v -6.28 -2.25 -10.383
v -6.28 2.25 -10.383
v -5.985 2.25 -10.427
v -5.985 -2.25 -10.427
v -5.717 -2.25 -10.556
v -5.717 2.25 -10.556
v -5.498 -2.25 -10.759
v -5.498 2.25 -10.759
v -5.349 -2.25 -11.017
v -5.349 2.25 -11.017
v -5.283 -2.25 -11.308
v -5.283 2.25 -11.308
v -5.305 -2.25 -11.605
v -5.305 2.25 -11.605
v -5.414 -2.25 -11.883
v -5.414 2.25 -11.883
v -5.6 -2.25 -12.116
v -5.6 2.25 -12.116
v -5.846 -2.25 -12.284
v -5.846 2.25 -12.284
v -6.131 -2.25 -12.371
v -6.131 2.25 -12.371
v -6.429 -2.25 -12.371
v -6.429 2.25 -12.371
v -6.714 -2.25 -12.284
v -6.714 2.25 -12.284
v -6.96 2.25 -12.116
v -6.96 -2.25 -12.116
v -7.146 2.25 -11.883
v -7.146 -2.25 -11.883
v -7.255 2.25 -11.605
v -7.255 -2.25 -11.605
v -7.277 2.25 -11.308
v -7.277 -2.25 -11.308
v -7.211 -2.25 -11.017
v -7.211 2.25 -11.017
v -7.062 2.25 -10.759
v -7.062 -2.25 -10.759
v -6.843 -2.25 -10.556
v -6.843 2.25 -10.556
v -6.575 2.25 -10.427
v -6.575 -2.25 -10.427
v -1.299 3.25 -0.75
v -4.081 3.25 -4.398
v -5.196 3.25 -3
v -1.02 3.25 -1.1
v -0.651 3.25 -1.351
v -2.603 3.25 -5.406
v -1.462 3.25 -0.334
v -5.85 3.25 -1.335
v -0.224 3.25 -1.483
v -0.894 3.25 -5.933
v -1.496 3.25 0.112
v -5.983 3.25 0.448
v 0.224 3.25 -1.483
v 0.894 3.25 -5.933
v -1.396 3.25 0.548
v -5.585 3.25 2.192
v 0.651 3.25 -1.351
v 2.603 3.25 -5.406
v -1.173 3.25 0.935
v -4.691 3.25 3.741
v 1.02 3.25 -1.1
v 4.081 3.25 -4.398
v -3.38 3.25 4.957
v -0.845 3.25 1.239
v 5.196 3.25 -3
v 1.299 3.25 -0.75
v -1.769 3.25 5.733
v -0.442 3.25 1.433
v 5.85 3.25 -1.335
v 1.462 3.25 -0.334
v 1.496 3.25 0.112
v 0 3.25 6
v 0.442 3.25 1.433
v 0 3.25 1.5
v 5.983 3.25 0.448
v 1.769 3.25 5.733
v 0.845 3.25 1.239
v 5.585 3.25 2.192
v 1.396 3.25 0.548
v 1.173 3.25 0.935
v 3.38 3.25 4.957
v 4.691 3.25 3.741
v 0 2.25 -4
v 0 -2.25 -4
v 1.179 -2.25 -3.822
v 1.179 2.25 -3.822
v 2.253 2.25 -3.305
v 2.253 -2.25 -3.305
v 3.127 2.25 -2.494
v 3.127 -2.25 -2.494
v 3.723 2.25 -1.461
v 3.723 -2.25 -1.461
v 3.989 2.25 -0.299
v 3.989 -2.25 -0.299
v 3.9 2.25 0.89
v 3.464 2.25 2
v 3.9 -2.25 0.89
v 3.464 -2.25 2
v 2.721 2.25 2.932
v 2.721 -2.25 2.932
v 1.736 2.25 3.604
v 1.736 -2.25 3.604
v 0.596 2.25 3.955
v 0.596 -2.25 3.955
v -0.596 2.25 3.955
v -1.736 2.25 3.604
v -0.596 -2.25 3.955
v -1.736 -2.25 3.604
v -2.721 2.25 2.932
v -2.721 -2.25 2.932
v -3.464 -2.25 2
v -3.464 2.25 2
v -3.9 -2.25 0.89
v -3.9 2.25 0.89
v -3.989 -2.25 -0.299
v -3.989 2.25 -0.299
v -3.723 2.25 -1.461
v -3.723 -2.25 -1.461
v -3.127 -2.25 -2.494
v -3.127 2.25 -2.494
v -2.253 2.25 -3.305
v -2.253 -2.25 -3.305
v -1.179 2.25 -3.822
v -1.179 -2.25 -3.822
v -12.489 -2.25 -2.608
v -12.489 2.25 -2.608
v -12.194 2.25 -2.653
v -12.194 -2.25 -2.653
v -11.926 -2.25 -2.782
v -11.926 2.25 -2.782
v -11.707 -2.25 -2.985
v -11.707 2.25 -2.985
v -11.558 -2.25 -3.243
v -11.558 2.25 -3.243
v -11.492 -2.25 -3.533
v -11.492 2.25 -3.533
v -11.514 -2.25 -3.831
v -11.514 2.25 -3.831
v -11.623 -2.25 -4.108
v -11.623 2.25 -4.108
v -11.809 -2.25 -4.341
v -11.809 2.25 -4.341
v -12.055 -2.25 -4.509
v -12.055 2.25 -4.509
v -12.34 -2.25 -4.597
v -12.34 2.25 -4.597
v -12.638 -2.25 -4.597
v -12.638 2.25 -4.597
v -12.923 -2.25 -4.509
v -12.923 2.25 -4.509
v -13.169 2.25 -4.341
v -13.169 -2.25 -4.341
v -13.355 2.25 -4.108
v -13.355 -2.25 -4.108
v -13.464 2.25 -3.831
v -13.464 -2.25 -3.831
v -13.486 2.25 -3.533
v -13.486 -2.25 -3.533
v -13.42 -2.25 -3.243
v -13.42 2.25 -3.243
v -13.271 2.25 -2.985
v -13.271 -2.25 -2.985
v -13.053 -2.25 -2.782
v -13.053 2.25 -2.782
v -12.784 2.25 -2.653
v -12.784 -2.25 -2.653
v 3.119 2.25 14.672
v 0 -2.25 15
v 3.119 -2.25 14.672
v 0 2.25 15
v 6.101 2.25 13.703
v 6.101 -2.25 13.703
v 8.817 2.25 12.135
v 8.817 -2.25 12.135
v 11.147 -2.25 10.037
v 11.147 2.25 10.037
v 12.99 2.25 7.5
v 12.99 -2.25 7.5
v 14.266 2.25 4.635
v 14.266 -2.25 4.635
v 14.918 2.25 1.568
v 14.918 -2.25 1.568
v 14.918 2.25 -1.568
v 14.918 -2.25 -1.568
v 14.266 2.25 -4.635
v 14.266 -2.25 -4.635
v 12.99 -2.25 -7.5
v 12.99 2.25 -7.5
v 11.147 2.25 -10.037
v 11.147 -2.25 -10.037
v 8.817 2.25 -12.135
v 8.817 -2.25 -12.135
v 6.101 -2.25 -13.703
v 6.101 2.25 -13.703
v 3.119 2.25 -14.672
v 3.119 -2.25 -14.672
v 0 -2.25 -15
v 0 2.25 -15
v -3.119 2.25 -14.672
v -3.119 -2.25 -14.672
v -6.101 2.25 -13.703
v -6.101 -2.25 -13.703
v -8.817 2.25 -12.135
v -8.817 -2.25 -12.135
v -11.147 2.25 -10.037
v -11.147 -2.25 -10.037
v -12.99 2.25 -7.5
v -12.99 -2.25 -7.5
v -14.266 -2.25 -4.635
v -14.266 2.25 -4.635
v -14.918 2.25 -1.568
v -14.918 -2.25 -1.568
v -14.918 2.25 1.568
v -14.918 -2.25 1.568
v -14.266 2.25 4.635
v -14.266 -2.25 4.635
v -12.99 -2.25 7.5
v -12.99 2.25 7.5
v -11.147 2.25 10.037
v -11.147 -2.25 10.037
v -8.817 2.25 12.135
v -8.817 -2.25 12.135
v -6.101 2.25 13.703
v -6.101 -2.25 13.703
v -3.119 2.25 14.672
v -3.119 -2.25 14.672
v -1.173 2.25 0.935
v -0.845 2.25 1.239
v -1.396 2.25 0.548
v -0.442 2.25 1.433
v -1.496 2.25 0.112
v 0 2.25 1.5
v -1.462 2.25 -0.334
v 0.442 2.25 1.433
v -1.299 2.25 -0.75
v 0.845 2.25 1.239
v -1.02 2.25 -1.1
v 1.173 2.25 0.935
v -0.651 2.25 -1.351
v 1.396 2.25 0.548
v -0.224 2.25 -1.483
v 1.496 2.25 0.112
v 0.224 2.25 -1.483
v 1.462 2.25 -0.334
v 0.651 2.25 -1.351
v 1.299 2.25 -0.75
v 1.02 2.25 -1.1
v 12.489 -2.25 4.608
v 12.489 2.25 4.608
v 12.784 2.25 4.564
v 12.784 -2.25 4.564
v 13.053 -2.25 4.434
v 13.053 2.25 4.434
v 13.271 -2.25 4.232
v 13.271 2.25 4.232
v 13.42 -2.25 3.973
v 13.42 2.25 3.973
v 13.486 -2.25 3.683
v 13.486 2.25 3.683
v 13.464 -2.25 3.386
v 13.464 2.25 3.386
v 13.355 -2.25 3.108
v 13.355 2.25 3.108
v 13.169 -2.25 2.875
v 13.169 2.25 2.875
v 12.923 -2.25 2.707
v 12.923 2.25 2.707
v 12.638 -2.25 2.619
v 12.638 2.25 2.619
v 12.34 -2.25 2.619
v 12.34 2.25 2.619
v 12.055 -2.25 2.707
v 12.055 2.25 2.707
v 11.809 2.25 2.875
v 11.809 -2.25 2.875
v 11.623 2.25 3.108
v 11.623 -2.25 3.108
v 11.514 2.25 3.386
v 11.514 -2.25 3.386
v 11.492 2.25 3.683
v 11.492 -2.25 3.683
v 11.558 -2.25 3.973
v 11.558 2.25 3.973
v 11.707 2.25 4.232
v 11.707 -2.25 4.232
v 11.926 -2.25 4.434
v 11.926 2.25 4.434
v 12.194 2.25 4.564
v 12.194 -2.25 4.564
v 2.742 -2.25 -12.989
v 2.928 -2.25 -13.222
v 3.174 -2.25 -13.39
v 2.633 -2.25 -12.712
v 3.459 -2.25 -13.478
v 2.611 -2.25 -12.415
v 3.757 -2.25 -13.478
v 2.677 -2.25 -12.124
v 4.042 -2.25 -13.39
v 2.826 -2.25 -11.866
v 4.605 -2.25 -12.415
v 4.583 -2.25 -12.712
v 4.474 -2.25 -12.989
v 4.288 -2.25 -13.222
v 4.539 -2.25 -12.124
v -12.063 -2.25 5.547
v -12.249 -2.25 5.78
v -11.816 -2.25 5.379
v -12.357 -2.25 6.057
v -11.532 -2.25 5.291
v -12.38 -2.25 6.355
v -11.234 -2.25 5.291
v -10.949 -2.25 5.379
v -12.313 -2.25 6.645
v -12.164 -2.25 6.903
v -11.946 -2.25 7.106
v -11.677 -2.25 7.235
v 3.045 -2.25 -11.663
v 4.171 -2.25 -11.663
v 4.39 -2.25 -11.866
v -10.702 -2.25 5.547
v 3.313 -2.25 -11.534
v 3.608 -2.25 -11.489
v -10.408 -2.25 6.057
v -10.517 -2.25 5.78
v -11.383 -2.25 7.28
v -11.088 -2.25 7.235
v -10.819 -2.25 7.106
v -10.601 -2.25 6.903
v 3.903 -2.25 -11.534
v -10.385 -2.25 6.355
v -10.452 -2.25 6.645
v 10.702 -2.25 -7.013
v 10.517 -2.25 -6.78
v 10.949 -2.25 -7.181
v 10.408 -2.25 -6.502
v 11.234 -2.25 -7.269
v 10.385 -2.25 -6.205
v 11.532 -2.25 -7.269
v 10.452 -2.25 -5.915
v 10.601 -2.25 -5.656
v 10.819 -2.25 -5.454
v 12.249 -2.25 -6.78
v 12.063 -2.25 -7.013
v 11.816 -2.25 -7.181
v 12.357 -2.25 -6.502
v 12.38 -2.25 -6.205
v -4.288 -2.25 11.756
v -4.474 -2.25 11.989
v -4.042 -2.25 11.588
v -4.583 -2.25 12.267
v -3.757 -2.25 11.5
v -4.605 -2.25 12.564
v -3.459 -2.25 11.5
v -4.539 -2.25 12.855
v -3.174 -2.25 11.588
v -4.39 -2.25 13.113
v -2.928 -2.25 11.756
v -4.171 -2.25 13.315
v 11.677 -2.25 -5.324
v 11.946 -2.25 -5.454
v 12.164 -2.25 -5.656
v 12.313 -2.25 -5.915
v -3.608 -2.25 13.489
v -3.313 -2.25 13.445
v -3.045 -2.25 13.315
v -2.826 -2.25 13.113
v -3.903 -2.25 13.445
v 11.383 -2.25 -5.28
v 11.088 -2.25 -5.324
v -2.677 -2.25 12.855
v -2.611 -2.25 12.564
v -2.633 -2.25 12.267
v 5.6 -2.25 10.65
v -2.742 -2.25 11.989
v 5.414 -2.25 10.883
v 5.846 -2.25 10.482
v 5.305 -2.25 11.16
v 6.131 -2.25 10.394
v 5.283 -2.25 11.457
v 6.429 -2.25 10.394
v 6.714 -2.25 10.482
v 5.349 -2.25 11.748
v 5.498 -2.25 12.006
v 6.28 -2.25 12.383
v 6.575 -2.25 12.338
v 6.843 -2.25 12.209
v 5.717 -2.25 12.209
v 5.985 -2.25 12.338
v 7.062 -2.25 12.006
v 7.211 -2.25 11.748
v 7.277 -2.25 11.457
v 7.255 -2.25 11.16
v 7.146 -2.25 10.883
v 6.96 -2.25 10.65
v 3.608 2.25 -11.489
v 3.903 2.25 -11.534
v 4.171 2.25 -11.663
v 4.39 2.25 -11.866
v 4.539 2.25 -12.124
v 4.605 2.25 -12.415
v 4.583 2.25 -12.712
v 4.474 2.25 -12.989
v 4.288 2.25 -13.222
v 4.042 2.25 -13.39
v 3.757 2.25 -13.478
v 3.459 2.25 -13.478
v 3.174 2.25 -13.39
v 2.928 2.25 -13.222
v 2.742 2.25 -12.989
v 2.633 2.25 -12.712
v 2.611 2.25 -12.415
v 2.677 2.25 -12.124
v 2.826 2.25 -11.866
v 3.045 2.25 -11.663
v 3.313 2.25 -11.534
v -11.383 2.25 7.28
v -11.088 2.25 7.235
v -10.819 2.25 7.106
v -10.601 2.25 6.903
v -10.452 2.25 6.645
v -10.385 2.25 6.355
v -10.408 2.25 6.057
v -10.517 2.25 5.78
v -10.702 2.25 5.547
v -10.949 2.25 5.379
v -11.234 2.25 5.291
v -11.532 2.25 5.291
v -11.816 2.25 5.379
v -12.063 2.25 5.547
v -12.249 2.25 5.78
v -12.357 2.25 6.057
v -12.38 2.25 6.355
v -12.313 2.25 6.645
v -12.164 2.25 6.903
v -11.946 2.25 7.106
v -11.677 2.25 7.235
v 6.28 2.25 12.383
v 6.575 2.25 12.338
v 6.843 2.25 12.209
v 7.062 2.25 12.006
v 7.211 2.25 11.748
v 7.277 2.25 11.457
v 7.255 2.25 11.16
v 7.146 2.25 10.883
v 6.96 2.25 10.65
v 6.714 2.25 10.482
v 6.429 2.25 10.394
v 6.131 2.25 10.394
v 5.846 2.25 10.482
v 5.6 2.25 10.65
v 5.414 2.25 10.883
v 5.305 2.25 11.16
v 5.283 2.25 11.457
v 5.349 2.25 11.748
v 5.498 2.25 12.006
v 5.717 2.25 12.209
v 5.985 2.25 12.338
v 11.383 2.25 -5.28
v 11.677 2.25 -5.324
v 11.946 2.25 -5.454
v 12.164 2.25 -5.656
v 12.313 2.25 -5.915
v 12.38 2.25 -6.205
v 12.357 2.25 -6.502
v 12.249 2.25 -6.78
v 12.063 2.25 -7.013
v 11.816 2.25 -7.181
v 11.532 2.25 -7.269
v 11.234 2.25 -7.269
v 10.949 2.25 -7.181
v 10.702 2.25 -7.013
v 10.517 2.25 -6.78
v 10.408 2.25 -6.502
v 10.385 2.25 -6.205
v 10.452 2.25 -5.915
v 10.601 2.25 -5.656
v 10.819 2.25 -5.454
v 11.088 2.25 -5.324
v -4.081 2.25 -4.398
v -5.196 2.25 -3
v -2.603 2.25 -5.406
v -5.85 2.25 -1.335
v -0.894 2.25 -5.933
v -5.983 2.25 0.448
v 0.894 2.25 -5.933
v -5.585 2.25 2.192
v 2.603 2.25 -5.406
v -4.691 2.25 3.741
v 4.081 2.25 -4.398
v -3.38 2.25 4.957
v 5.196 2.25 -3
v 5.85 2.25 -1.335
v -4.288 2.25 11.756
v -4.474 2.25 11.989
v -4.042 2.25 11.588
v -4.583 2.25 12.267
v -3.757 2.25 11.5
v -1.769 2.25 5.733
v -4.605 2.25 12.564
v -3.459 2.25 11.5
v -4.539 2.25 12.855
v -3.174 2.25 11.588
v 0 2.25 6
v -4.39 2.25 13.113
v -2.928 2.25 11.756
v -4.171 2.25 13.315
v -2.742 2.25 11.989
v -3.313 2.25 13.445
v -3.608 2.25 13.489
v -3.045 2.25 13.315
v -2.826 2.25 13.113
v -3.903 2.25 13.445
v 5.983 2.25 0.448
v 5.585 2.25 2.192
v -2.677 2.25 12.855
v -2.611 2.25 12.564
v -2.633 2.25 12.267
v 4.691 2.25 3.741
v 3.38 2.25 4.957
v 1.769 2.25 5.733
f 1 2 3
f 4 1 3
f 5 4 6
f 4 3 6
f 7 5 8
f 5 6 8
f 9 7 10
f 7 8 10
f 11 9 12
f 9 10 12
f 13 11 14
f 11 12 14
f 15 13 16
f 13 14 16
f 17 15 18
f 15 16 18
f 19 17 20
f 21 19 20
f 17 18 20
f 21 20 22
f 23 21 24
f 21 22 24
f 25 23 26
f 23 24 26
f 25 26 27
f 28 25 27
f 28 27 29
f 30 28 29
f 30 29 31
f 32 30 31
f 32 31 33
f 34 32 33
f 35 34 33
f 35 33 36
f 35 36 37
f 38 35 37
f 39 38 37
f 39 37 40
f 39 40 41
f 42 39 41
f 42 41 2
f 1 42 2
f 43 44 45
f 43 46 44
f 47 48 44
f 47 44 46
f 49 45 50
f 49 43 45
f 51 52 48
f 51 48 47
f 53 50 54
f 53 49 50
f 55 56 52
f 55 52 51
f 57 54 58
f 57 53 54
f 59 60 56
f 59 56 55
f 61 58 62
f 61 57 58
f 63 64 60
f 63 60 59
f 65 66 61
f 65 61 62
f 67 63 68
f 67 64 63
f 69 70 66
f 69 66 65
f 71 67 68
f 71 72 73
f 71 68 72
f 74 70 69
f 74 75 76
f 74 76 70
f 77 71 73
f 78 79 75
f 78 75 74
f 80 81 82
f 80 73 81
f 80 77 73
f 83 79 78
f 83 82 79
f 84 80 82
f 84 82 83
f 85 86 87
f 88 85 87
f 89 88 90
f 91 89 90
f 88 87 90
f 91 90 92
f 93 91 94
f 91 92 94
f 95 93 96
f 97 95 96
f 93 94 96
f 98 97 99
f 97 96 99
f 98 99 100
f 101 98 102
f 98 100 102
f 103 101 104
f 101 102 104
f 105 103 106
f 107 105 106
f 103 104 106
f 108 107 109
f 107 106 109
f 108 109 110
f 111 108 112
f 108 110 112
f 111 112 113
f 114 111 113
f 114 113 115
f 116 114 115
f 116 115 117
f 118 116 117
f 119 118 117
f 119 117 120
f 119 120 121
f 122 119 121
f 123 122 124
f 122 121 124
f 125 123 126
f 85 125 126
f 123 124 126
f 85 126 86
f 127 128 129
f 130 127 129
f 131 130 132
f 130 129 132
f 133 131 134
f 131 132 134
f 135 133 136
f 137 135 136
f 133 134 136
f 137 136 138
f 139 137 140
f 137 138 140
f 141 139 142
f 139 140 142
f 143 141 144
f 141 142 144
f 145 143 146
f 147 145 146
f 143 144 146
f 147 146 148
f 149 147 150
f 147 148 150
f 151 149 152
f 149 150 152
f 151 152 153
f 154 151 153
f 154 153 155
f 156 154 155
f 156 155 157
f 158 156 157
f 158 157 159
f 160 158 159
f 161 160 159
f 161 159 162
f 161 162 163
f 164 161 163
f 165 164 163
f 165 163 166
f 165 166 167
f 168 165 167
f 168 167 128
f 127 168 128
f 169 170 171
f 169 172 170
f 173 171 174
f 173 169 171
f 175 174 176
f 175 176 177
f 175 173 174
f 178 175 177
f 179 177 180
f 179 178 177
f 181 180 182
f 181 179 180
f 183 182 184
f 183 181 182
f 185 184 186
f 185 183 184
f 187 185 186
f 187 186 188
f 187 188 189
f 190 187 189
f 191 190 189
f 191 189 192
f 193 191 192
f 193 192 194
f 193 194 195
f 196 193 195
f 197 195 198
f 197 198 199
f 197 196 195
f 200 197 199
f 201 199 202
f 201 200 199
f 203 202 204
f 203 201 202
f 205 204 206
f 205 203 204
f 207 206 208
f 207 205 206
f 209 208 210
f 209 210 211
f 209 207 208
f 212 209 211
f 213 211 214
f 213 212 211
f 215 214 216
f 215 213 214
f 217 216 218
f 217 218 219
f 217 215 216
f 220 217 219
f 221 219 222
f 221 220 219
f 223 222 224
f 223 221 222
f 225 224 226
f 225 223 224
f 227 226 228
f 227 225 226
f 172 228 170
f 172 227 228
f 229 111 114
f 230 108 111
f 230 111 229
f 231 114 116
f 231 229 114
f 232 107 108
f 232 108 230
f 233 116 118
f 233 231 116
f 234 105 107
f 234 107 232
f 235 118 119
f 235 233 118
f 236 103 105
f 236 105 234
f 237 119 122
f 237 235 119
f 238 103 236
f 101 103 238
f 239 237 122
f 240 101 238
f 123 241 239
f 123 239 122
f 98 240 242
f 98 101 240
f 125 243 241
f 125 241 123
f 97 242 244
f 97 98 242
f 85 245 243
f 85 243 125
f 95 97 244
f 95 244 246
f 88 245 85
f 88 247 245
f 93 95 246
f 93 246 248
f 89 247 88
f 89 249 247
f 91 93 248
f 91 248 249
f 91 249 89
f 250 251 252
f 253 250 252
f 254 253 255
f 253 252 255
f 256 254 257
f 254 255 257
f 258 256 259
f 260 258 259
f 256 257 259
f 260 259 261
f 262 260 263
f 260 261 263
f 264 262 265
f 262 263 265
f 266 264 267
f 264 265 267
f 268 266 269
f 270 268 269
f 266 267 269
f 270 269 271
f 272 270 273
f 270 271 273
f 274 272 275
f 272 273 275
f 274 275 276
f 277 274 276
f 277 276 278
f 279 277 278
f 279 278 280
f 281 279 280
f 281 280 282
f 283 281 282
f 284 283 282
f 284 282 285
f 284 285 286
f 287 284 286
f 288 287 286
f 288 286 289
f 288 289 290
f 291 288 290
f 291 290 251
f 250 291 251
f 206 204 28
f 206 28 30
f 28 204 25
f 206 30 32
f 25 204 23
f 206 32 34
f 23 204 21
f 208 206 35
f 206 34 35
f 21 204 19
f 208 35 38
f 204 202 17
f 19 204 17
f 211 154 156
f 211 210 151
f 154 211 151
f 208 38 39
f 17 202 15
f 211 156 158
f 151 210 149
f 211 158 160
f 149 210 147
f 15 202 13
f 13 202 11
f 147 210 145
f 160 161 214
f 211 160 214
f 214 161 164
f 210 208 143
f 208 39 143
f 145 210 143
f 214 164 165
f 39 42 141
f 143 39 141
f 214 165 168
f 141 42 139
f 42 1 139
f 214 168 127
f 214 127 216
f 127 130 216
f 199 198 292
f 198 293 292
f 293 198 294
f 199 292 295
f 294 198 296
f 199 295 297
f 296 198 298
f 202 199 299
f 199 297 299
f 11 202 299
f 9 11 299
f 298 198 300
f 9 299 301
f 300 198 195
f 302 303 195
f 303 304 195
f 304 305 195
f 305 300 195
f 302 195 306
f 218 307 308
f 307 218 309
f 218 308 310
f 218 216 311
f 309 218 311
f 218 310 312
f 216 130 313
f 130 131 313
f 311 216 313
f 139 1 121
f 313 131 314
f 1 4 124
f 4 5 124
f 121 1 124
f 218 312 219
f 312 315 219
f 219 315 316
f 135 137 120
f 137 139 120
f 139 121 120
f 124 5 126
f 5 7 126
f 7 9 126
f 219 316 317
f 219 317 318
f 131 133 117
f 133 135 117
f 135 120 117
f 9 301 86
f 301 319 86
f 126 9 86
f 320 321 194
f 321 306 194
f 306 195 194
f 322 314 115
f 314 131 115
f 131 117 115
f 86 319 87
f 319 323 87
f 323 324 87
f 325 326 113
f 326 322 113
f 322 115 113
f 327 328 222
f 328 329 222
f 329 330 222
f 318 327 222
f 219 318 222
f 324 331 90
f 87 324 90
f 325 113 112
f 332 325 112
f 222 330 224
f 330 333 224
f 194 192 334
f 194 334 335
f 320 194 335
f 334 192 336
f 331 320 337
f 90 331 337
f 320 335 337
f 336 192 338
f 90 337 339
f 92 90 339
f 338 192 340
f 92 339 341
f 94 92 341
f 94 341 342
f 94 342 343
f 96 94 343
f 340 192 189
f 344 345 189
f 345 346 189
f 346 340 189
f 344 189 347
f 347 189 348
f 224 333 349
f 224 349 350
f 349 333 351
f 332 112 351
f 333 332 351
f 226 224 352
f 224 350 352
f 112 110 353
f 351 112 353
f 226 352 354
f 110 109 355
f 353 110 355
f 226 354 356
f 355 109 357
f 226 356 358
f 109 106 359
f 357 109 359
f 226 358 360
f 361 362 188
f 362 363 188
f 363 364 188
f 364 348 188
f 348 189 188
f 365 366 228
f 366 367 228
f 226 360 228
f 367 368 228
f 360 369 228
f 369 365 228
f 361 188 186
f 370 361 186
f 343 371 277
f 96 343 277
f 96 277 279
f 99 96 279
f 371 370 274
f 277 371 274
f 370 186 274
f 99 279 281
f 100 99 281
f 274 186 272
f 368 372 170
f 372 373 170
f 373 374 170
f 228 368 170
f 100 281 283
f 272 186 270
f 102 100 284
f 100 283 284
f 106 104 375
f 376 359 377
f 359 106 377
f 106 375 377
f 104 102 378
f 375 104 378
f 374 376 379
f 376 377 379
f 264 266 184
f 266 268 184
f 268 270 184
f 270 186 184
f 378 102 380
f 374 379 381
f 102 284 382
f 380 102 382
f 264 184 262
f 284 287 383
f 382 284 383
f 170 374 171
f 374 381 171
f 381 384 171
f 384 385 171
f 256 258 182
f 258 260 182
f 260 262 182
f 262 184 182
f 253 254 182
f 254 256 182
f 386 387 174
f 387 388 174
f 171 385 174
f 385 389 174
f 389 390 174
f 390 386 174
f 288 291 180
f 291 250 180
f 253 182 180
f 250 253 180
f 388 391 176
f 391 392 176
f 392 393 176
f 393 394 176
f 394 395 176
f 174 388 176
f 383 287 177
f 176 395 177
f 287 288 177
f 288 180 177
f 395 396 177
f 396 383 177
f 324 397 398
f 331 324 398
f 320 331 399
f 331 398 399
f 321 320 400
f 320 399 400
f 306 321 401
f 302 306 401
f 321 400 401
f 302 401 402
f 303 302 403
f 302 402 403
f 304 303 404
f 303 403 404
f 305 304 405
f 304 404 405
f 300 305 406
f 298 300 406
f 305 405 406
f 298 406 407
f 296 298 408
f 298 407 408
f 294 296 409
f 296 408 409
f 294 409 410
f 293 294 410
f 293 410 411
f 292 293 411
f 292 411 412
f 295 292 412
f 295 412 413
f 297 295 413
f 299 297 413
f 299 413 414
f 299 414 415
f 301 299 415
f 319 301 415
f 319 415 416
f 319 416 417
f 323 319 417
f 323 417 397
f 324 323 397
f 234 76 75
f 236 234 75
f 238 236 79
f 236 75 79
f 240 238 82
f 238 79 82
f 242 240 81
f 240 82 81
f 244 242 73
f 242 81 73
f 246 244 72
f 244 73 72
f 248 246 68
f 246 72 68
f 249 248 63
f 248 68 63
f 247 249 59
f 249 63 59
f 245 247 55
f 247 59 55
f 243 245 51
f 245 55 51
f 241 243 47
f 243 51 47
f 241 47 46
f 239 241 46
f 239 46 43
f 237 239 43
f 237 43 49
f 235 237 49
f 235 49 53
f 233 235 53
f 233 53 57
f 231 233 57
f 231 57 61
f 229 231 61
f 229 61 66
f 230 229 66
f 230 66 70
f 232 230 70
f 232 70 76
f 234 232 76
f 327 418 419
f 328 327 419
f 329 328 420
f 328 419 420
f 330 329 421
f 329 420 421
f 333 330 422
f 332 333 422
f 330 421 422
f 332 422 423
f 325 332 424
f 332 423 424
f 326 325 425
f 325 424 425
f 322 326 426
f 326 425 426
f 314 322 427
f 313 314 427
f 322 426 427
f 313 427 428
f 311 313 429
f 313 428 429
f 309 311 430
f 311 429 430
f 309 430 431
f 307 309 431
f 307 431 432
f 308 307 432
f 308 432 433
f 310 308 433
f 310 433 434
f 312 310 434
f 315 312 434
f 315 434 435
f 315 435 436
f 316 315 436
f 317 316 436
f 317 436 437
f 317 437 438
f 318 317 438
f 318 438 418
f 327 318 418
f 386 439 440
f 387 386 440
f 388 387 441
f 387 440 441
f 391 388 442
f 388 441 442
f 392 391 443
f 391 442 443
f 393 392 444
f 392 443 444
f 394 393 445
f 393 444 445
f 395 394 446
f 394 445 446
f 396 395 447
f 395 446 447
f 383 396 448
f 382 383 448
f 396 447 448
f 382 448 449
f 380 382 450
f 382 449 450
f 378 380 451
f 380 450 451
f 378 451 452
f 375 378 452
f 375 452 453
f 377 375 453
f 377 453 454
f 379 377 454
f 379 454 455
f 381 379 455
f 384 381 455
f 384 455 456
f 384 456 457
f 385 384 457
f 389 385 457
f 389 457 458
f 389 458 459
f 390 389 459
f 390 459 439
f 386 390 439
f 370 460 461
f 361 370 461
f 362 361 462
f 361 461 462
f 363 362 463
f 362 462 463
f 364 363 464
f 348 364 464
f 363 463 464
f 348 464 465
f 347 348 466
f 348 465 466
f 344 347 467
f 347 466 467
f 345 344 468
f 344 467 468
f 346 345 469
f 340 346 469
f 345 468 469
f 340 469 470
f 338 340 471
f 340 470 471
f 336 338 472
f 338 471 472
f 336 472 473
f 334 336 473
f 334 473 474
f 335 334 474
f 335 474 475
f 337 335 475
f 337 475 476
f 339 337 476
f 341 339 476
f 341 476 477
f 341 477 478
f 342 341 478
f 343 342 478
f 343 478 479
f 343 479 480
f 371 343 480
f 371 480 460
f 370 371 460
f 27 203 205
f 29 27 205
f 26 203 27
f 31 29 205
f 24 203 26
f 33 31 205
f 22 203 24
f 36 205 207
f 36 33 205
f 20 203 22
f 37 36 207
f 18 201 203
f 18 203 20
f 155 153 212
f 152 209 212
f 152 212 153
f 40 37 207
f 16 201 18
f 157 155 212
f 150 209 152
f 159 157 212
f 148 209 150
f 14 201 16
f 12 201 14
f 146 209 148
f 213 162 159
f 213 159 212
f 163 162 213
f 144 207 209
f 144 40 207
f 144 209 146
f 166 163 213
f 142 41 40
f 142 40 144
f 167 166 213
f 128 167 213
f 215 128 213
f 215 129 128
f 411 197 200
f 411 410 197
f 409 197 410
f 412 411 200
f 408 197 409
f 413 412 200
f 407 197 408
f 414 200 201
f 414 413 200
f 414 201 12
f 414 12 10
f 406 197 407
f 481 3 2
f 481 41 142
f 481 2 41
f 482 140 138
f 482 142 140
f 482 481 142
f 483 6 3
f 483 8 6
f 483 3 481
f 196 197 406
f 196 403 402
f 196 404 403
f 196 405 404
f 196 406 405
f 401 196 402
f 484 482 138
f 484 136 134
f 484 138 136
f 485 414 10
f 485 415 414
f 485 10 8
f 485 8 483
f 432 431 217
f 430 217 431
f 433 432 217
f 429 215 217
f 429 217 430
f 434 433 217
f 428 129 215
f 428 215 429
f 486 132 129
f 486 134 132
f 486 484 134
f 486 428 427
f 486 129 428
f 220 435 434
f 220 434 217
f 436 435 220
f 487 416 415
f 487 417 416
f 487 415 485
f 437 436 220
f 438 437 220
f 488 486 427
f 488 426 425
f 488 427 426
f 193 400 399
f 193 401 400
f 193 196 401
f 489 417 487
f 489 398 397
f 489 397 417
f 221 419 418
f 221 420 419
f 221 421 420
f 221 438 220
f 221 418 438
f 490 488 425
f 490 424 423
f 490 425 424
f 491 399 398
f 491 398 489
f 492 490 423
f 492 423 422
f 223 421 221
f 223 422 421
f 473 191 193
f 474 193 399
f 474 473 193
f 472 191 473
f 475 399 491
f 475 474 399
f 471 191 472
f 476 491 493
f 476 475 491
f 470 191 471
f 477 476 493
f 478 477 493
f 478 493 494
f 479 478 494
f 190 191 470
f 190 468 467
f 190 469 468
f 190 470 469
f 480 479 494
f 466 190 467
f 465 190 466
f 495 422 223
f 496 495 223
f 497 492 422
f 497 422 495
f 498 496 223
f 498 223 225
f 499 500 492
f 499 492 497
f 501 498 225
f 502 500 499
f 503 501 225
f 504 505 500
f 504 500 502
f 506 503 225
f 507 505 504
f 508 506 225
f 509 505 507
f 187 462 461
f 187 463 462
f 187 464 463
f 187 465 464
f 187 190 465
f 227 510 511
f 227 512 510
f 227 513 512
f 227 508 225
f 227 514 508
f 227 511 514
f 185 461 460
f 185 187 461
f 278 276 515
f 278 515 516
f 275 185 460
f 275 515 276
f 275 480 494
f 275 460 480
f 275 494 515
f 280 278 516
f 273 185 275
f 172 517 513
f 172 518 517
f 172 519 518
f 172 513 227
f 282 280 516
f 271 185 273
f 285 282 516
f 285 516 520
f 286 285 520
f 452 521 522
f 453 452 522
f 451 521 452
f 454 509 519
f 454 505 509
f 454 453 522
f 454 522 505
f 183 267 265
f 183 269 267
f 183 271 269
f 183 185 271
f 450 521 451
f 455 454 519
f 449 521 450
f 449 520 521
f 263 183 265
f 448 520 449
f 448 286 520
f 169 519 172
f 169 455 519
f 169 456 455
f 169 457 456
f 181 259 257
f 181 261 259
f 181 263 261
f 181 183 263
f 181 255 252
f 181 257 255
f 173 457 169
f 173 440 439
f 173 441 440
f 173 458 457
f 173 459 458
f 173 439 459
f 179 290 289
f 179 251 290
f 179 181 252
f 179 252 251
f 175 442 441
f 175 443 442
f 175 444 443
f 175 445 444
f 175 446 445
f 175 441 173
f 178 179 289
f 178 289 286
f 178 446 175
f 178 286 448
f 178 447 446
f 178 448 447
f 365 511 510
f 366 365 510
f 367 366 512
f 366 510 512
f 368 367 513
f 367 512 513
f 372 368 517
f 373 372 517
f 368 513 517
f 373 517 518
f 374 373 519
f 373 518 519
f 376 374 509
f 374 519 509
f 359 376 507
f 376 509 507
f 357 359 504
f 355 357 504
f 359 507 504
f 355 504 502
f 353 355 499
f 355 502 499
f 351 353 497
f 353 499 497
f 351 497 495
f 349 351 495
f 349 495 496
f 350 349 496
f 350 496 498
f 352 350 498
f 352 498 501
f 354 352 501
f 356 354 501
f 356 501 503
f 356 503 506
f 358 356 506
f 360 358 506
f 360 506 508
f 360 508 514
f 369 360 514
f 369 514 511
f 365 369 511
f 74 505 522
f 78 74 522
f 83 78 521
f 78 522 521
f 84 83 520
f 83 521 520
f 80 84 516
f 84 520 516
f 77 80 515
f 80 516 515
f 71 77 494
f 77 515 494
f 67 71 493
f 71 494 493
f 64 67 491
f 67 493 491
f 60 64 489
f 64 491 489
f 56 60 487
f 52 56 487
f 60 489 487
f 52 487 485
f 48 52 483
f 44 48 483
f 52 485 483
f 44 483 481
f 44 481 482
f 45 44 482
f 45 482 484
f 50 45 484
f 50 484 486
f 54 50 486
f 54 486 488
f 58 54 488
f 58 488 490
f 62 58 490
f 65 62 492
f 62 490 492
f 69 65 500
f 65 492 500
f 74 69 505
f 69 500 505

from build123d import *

# Parameters (mm, degrees)
SKETCH_1_R          = 15
EXTRUDE_1_DEPTH     = 2.25
SKETCH_2_R          = 6
EXTRUDE_2_DEPTH     = 1
SKETCH_3_R          = 1
CUT_EXTRUDE_1_DEPTH = 5
SKETCH_4_R          = 4
CUT_EXTRUDE_2_DEPTH = 4.5
SKETCH_5_R          = 1.5
CUT_EXTRUDE_3_DEPTH = 4.5


with BuildPart() as part:
    # ｽｹｯﾁ1 → ﾎﾞｽ - 押し出し1 (new, symmetric)
    with BuildSketch(Plane(origin=(0, 0, 0), x_dir=(1, 0, 0), z_dir=(0, 1, 0))):
        with Locations(Location((0, 0, 0), (0, 0, 270))):
            Circle(SKETCH_1_R)
    extrude(amount=EXTRUDE_1_DEPTH, both=True)

    # ｽｹｯﾁ2 → ﾎﾞｽ - 押し出し2 (add)
    with BuildSketch(Plane(origin=(0, 2.25, 0), x_dir=(1, 0, 0), z_dir=(0, 1, 0))):
        with Locations(Location((0, 0, 0), (0, 0, 270))):
            Circle(SKETCH_2_R)
    extrude(amount=EXTRUDE_2_DEPTH)

    # ｽｹｯﾁ3 → ｶｯﾄ - 押し出し1 (cut)
    with BuildSketch(Plane(origin=(0, 2.25, 0), x_dir=(1, 0, 0), z_dir=(0, 1, 0))):
        with Locations(Location((-11.382561056, -6.279912723, 0), (0, 0, 270))):
            Circle(SKETCH_3_R)
        with Locations(Location((-12.489254982, 3.608117238, 0), (0, 0, 270))):
            Circle(SKETCH_3_R)
        with Locations(Location((-6.279912723, 11.382561056, 0), (0, 0, 270))):
            Circle(SKETCH_3_R)
        with Locations(Location((3.608117238, 12.489254982, 0), (0, 0, 270))):
            Circle(SKETCH_3_R)
        with Locations(Location((11.382561056, 6.279912723, 0), (0, 0, 270))):
            Circle(SKETCH_3_R)
        with Locations(Location((12.489254982, -3.608117238, 0), (0, 0, 270))):
            Circle(SKETCH_3_R)
        with Locations(Location((6.279912723, -11.382561056, 0), (0, 0, 270))):
            Circle(SKETCH_3_R)
        with Locations(Location((-3.608117238, -12.489254982, 0), (0, 0, 270))):
            Circle(SKETCH_3_R)
    extrude(amount=-CUT_EXTRUDE_1_DEPTH, mode=Mode.SUBTRACT)

    # ｽｹｯﾁ4 → ｶｯﾄ - 押し出し2 (cut)
    with BuildSketch(Plane.XZ.offset(2.25)):
        with Locations(Location((0, 0, 0), (0, 0, 270))):
            Circle(SKETCH_4_R)
    extrude(amount=-CUT_EXTRUDE_2_DEPTH, mode=Mode.SUBTRACT)

    # ｽｹｯﾁ5 → ｶｯﾄ - 押し出し3 (cut)
    with BuildSketch(Plane(origin=(0, 3.25, 0), x_dir=(1, 0, 0), z_dir=(0, 1, 0))):
        with Locations(Location((0, 0, 0), (0, 0, 270))):
            Circle(SKETCH_5_R)
    extrude(amount=-CUT_EXTRUDE_3_DEPTH, mode=Mode.SUBTRACT)


solid = part.part
